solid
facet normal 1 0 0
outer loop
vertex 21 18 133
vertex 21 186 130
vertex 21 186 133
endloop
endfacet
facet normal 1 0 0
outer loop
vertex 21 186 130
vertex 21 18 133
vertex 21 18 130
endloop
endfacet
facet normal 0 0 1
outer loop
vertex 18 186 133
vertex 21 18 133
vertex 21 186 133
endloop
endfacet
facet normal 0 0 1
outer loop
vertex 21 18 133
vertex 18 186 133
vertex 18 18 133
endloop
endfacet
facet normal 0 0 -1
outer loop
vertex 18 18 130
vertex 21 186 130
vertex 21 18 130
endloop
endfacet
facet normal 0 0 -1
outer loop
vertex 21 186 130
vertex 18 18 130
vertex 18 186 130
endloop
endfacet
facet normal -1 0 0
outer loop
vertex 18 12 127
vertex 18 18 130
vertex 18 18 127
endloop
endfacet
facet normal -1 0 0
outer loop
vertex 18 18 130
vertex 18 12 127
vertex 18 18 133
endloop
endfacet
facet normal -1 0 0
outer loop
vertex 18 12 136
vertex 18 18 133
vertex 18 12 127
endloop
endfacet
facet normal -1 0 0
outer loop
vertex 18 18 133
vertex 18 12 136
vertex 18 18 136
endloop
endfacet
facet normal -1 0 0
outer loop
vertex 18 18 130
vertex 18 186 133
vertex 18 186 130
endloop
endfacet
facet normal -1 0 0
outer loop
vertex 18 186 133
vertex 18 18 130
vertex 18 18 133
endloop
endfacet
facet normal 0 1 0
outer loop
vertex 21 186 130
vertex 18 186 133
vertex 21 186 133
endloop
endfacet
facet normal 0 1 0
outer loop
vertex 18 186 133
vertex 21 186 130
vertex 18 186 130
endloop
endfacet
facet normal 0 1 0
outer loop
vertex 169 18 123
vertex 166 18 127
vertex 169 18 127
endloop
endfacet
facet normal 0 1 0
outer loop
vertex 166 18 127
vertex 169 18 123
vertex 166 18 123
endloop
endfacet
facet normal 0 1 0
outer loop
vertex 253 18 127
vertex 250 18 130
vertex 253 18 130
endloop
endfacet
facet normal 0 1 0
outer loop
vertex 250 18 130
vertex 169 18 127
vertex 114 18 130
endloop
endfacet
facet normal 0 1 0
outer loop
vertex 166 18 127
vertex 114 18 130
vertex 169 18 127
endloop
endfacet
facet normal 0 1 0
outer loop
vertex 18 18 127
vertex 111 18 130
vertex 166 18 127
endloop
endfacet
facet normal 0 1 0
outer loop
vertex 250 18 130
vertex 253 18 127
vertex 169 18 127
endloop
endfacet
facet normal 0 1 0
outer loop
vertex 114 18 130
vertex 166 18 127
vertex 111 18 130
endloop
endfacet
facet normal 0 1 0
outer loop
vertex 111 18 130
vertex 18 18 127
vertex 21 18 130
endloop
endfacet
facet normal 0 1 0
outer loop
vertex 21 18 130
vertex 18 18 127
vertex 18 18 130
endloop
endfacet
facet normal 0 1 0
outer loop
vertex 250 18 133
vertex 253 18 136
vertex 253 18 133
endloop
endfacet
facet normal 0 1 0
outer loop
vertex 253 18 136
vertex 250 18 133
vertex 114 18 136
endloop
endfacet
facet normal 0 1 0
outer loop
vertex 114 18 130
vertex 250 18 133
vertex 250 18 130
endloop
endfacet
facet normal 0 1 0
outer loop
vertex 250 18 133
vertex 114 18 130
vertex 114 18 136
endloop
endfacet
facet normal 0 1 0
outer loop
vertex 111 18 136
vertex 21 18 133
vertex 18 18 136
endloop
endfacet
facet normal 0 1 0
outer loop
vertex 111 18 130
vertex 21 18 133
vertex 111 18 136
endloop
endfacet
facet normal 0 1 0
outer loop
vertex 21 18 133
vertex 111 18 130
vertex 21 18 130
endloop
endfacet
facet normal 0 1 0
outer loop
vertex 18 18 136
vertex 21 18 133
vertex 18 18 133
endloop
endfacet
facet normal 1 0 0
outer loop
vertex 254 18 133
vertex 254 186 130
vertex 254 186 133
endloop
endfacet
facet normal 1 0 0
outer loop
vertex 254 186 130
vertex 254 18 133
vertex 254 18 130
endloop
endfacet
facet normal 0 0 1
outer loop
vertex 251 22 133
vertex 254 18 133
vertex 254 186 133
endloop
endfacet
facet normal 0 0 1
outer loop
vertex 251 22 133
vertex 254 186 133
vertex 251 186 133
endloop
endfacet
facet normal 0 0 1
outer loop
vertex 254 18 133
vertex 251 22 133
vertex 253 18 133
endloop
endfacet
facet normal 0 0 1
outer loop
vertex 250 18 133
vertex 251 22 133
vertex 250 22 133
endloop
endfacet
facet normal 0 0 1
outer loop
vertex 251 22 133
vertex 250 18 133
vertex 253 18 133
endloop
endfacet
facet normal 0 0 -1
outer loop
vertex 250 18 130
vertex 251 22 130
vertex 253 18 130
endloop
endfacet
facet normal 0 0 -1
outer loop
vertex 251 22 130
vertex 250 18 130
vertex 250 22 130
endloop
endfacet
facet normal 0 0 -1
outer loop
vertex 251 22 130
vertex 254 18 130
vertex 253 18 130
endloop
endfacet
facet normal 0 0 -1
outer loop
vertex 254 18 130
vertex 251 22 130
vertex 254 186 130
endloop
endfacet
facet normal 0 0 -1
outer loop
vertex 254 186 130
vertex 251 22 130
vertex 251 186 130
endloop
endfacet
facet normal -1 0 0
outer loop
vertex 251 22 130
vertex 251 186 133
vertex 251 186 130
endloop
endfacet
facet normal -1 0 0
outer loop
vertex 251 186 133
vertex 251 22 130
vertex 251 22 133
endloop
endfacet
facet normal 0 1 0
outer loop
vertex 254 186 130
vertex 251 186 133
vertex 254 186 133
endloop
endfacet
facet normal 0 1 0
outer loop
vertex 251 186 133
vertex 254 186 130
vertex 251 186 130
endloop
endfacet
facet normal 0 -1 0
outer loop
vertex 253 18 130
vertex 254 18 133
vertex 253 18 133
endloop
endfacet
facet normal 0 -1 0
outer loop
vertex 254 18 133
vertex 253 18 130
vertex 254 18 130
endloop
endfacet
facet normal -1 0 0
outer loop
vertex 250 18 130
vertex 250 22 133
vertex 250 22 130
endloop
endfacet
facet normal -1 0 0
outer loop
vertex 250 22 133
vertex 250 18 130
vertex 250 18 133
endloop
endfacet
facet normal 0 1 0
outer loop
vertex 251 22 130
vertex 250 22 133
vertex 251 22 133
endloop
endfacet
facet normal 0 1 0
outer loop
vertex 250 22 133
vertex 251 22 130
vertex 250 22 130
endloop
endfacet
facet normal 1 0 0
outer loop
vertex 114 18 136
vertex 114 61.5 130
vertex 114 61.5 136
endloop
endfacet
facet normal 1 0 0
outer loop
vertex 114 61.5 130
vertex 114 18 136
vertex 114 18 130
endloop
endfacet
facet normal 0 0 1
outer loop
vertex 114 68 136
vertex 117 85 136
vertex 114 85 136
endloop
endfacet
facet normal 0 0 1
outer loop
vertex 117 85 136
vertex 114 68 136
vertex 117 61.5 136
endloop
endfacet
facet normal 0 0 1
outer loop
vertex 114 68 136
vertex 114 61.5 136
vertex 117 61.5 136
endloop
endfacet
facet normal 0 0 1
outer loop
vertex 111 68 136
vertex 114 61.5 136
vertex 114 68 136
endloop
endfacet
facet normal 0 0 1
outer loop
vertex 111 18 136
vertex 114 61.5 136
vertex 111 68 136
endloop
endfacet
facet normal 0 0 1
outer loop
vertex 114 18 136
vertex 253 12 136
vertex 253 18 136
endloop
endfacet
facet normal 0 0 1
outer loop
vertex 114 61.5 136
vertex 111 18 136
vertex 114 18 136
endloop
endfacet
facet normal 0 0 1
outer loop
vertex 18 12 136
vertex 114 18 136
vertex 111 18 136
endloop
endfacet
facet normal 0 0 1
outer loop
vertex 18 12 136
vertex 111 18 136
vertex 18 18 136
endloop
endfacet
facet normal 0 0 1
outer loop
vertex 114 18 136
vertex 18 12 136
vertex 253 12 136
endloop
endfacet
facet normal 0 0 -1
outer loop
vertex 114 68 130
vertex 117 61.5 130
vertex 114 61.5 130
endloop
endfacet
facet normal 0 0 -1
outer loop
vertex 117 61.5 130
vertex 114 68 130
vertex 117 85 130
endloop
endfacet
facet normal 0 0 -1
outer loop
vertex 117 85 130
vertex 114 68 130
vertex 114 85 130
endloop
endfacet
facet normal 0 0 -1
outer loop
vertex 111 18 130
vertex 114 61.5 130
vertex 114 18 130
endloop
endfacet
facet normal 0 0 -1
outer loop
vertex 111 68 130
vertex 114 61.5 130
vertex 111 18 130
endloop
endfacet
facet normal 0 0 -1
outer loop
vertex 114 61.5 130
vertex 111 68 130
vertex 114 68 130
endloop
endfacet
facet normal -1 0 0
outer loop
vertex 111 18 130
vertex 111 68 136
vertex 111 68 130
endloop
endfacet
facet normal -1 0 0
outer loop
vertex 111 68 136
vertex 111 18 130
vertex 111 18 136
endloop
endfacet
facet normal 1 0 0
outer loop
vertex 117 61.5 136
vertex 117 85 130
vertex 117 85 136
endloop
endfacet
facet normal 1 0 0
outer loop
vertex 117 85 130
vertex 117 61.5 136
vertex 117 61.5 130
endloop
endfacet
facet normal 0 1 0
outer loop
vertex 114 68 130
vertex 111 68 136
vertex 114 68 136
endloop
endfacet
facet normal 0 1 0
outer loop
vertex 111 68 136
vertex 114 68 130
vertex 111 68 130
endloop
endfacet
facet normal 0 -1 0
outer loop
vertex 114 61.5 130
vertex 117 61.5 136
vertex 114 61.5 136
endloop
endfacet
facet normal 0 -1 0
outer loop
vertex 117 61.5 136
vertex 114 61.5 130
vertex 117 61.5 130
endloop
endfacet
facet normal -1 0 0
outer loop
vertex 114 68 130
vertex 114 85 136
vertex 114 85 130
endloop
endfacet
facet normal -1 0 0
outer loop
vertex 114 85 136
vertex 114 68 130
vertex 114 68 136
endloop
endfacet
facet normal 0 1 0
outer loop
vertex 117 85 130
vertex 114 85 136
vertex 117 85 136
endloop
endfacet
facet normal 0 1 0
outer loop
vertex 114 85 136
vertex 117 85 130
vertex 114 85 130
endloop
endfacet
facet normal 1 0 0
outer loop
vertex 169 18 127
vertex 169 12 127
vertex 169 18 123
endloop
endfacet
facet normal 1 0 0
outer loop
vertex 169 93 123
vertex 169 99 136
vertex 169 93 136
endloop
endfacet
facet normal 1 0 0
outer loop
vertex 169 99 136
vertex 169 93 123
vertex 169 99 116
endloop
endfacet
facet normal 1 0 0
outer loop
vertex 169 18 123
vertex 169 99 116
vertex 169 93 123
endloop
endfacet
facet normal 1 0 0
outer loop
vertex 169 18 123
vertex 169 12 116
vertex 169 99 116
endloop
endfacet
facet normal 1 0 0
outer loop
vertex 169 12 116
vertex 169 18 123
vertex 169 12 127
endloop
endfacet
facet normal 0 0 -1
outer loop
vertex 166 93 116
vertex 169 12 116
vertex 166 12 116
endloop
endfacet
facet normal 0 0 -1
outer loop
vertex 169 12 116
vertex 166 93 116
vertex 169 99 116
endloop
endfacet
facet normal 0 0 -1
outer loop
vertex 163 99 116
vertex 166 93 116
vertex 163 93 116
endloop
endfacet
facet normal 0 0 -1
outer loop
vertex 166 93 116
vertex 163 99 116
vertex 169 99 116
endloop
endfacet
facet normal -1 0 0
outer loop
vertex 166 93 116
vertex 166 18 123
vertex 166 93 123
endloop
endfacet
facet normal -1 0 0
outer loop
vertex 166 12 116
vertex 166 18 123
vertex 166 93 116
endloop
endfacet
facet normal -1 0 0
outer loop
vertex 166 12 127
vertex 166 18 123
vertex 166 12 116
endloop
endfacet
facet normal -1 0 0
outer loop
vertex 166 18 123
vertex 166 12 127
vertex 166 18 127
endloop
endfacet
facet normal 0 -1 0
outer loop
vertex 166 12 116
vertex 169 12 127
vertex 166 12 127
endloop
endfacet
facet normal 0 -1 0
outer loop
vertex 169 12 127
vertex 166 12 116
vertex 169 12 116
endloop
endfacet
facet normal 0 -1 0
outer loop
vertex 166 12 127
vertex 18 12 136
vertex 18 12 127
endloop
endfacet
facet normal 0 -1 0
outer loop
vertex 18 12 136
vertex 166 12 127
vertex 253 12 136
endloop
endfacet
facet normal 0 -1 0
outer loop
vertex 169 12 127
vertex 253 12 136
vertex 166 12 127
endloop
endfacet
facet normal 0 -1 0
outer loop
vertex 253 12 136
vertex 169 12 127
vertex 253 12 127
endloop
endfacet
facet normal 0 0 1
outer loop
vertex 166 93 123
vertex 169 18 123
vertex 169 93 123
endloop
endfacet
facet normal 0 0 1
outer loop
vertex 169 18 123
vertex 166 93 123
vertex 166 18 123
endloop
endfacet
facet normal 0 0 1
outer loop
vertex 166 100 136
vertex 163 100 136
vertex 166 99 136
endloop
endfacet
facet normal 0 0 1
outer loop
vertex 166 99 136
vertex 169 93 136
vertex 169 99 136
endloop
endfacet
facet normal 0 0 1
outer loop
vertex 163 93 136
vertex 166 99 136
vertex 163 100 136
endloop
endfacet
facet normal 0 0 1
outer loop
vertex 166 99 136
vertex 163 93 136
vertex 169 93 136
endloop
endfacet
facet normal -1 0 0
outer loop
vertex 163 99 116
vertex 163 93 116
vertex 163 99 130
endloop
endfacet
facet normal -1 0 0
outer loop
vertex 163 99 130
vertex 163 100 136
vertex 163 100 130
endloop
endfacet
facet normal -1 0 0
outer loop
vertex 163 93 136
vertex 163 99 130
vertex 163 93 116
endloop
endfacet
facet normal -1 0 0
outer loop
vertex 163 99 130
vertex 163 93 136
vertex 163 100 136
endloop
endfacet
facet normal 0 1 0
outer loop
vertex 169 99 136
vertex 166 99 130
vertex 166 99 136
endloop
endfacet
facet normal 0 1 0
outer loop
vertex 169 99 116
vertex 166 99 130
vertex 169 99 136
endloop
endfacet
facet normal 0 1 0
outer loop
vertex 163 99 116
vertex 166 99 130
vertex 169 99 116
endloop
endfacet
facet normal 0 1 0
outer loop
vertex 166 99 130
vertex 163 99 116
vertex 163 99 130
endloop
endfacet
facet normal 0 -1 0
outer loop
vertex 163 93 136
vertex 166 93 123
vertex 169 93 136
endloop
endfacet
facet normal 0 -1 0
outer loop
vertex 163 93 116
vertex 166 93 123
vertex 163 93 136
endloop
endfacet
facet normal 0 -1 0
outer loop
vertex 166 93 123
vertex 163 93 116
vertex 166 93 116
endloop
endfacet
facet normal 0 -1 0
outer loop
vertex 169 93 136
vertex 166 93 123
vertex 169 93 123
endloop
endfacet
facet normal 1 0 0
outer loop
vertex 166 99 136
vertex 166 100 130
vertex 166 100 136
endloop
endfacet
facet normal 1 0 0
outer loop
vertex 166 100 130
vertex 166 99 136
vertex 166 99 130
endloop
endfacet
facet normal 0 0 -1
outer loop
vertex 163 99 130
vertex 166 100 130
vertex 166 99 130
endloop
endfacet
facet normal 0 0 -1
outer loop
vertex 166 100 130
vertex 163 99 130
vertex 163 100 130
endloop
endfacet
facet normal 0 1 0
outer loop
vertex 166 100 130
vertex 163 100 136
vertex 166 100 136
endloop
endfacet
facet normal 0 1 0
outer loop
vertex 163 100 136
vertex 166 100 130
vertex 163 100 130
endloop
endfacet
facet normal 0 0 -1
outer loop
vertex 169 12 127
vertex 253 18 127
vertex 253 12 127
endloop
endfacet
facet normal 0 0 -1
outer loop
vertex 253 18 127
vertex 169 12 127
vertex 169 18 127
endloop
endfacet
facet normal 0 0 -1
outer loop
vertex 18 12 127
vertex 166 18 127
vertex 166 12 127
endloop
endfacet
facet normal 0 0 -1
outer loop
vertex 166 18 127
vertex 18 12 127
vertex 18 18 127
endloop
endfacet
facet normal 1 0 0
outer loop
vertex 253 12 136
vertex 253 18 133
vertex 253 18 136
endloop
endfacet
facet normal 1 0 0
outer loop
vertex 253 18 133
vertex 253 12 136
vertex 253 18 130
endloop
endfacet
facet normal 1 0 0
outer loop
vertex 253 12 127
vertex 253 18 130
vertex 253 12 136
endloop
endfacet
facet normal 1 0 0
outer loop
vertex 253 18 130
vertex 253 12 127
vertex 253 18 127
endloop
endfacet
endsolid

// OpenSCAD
// G5 actual five discrete members, EDITABLE reviewer solid model; original D7 SHA 20ee6d8c001ee16d64e47edb5456eff3bc39f3390a85dd94b69b7eb1504d878f
// The external six interfaces (2 G5 guides, 4 sidewood anchors) NOT QUALIFIED.
$fn=32;part_name="ASSEMBLY";
module CROSSBAR(){translate([18,12,127])cube([235,6,9]);}
module SIDE_LEFT(){difference(){union(){translate([18,18,130])cube([3,168,3]);translate([18,16,130])cube([3,6,3]);}CROSSBAR();}}
module SIDE_RIGHT(){difference(){union(){translate([251,18,130])cube([3,168,3]);translate([250,16,130])cube([3,6,3]);}CROSSBAR();}}
module G5_LEFT(){difference(){union(){translate([111,17,130])cube([3,46,6]);translate([111,61.5,130])cube([6,6.5,6]);translate([114,66,130])cube([3,19,6]);}CROSSBAR();}}
module G5_RIGHT(){difference(){union(){translate([166,12,116])cube([3,6,20]);translate([166,17,116])cube([3,73,7]);translate([166,89,116])cube([3,6,7]);translate([163,93,116])cube([6,6,20]);translate([163,95,130])cube([3,5,6]);}CROSSBAR();}}
module ASSEMBLY(){color([.02,.29,.45])CROSSBAR();color([.35,.52,.68])SIDE_LEFT();color([.35,.52,.68])SIDE_RIGHT();color([.08,.63,.45])G5_LEFT();color([.84,.37,.28])G5_RIGHT();}
if(part_name=="ASSEMBLY") ASSEMBLY(); else { if(part_name=="CROSSBAR")CROSSBAR();if(part_name=="SIDE_LEFT")SIDE_LEFT();if(part_name=="SIDE_RIGHT")SIDE_RIGHT();if(part_name=="G5_LEFT")G5_LEFT();if(part_name=="G5_RIGHT")G5_RIGHT(); }
